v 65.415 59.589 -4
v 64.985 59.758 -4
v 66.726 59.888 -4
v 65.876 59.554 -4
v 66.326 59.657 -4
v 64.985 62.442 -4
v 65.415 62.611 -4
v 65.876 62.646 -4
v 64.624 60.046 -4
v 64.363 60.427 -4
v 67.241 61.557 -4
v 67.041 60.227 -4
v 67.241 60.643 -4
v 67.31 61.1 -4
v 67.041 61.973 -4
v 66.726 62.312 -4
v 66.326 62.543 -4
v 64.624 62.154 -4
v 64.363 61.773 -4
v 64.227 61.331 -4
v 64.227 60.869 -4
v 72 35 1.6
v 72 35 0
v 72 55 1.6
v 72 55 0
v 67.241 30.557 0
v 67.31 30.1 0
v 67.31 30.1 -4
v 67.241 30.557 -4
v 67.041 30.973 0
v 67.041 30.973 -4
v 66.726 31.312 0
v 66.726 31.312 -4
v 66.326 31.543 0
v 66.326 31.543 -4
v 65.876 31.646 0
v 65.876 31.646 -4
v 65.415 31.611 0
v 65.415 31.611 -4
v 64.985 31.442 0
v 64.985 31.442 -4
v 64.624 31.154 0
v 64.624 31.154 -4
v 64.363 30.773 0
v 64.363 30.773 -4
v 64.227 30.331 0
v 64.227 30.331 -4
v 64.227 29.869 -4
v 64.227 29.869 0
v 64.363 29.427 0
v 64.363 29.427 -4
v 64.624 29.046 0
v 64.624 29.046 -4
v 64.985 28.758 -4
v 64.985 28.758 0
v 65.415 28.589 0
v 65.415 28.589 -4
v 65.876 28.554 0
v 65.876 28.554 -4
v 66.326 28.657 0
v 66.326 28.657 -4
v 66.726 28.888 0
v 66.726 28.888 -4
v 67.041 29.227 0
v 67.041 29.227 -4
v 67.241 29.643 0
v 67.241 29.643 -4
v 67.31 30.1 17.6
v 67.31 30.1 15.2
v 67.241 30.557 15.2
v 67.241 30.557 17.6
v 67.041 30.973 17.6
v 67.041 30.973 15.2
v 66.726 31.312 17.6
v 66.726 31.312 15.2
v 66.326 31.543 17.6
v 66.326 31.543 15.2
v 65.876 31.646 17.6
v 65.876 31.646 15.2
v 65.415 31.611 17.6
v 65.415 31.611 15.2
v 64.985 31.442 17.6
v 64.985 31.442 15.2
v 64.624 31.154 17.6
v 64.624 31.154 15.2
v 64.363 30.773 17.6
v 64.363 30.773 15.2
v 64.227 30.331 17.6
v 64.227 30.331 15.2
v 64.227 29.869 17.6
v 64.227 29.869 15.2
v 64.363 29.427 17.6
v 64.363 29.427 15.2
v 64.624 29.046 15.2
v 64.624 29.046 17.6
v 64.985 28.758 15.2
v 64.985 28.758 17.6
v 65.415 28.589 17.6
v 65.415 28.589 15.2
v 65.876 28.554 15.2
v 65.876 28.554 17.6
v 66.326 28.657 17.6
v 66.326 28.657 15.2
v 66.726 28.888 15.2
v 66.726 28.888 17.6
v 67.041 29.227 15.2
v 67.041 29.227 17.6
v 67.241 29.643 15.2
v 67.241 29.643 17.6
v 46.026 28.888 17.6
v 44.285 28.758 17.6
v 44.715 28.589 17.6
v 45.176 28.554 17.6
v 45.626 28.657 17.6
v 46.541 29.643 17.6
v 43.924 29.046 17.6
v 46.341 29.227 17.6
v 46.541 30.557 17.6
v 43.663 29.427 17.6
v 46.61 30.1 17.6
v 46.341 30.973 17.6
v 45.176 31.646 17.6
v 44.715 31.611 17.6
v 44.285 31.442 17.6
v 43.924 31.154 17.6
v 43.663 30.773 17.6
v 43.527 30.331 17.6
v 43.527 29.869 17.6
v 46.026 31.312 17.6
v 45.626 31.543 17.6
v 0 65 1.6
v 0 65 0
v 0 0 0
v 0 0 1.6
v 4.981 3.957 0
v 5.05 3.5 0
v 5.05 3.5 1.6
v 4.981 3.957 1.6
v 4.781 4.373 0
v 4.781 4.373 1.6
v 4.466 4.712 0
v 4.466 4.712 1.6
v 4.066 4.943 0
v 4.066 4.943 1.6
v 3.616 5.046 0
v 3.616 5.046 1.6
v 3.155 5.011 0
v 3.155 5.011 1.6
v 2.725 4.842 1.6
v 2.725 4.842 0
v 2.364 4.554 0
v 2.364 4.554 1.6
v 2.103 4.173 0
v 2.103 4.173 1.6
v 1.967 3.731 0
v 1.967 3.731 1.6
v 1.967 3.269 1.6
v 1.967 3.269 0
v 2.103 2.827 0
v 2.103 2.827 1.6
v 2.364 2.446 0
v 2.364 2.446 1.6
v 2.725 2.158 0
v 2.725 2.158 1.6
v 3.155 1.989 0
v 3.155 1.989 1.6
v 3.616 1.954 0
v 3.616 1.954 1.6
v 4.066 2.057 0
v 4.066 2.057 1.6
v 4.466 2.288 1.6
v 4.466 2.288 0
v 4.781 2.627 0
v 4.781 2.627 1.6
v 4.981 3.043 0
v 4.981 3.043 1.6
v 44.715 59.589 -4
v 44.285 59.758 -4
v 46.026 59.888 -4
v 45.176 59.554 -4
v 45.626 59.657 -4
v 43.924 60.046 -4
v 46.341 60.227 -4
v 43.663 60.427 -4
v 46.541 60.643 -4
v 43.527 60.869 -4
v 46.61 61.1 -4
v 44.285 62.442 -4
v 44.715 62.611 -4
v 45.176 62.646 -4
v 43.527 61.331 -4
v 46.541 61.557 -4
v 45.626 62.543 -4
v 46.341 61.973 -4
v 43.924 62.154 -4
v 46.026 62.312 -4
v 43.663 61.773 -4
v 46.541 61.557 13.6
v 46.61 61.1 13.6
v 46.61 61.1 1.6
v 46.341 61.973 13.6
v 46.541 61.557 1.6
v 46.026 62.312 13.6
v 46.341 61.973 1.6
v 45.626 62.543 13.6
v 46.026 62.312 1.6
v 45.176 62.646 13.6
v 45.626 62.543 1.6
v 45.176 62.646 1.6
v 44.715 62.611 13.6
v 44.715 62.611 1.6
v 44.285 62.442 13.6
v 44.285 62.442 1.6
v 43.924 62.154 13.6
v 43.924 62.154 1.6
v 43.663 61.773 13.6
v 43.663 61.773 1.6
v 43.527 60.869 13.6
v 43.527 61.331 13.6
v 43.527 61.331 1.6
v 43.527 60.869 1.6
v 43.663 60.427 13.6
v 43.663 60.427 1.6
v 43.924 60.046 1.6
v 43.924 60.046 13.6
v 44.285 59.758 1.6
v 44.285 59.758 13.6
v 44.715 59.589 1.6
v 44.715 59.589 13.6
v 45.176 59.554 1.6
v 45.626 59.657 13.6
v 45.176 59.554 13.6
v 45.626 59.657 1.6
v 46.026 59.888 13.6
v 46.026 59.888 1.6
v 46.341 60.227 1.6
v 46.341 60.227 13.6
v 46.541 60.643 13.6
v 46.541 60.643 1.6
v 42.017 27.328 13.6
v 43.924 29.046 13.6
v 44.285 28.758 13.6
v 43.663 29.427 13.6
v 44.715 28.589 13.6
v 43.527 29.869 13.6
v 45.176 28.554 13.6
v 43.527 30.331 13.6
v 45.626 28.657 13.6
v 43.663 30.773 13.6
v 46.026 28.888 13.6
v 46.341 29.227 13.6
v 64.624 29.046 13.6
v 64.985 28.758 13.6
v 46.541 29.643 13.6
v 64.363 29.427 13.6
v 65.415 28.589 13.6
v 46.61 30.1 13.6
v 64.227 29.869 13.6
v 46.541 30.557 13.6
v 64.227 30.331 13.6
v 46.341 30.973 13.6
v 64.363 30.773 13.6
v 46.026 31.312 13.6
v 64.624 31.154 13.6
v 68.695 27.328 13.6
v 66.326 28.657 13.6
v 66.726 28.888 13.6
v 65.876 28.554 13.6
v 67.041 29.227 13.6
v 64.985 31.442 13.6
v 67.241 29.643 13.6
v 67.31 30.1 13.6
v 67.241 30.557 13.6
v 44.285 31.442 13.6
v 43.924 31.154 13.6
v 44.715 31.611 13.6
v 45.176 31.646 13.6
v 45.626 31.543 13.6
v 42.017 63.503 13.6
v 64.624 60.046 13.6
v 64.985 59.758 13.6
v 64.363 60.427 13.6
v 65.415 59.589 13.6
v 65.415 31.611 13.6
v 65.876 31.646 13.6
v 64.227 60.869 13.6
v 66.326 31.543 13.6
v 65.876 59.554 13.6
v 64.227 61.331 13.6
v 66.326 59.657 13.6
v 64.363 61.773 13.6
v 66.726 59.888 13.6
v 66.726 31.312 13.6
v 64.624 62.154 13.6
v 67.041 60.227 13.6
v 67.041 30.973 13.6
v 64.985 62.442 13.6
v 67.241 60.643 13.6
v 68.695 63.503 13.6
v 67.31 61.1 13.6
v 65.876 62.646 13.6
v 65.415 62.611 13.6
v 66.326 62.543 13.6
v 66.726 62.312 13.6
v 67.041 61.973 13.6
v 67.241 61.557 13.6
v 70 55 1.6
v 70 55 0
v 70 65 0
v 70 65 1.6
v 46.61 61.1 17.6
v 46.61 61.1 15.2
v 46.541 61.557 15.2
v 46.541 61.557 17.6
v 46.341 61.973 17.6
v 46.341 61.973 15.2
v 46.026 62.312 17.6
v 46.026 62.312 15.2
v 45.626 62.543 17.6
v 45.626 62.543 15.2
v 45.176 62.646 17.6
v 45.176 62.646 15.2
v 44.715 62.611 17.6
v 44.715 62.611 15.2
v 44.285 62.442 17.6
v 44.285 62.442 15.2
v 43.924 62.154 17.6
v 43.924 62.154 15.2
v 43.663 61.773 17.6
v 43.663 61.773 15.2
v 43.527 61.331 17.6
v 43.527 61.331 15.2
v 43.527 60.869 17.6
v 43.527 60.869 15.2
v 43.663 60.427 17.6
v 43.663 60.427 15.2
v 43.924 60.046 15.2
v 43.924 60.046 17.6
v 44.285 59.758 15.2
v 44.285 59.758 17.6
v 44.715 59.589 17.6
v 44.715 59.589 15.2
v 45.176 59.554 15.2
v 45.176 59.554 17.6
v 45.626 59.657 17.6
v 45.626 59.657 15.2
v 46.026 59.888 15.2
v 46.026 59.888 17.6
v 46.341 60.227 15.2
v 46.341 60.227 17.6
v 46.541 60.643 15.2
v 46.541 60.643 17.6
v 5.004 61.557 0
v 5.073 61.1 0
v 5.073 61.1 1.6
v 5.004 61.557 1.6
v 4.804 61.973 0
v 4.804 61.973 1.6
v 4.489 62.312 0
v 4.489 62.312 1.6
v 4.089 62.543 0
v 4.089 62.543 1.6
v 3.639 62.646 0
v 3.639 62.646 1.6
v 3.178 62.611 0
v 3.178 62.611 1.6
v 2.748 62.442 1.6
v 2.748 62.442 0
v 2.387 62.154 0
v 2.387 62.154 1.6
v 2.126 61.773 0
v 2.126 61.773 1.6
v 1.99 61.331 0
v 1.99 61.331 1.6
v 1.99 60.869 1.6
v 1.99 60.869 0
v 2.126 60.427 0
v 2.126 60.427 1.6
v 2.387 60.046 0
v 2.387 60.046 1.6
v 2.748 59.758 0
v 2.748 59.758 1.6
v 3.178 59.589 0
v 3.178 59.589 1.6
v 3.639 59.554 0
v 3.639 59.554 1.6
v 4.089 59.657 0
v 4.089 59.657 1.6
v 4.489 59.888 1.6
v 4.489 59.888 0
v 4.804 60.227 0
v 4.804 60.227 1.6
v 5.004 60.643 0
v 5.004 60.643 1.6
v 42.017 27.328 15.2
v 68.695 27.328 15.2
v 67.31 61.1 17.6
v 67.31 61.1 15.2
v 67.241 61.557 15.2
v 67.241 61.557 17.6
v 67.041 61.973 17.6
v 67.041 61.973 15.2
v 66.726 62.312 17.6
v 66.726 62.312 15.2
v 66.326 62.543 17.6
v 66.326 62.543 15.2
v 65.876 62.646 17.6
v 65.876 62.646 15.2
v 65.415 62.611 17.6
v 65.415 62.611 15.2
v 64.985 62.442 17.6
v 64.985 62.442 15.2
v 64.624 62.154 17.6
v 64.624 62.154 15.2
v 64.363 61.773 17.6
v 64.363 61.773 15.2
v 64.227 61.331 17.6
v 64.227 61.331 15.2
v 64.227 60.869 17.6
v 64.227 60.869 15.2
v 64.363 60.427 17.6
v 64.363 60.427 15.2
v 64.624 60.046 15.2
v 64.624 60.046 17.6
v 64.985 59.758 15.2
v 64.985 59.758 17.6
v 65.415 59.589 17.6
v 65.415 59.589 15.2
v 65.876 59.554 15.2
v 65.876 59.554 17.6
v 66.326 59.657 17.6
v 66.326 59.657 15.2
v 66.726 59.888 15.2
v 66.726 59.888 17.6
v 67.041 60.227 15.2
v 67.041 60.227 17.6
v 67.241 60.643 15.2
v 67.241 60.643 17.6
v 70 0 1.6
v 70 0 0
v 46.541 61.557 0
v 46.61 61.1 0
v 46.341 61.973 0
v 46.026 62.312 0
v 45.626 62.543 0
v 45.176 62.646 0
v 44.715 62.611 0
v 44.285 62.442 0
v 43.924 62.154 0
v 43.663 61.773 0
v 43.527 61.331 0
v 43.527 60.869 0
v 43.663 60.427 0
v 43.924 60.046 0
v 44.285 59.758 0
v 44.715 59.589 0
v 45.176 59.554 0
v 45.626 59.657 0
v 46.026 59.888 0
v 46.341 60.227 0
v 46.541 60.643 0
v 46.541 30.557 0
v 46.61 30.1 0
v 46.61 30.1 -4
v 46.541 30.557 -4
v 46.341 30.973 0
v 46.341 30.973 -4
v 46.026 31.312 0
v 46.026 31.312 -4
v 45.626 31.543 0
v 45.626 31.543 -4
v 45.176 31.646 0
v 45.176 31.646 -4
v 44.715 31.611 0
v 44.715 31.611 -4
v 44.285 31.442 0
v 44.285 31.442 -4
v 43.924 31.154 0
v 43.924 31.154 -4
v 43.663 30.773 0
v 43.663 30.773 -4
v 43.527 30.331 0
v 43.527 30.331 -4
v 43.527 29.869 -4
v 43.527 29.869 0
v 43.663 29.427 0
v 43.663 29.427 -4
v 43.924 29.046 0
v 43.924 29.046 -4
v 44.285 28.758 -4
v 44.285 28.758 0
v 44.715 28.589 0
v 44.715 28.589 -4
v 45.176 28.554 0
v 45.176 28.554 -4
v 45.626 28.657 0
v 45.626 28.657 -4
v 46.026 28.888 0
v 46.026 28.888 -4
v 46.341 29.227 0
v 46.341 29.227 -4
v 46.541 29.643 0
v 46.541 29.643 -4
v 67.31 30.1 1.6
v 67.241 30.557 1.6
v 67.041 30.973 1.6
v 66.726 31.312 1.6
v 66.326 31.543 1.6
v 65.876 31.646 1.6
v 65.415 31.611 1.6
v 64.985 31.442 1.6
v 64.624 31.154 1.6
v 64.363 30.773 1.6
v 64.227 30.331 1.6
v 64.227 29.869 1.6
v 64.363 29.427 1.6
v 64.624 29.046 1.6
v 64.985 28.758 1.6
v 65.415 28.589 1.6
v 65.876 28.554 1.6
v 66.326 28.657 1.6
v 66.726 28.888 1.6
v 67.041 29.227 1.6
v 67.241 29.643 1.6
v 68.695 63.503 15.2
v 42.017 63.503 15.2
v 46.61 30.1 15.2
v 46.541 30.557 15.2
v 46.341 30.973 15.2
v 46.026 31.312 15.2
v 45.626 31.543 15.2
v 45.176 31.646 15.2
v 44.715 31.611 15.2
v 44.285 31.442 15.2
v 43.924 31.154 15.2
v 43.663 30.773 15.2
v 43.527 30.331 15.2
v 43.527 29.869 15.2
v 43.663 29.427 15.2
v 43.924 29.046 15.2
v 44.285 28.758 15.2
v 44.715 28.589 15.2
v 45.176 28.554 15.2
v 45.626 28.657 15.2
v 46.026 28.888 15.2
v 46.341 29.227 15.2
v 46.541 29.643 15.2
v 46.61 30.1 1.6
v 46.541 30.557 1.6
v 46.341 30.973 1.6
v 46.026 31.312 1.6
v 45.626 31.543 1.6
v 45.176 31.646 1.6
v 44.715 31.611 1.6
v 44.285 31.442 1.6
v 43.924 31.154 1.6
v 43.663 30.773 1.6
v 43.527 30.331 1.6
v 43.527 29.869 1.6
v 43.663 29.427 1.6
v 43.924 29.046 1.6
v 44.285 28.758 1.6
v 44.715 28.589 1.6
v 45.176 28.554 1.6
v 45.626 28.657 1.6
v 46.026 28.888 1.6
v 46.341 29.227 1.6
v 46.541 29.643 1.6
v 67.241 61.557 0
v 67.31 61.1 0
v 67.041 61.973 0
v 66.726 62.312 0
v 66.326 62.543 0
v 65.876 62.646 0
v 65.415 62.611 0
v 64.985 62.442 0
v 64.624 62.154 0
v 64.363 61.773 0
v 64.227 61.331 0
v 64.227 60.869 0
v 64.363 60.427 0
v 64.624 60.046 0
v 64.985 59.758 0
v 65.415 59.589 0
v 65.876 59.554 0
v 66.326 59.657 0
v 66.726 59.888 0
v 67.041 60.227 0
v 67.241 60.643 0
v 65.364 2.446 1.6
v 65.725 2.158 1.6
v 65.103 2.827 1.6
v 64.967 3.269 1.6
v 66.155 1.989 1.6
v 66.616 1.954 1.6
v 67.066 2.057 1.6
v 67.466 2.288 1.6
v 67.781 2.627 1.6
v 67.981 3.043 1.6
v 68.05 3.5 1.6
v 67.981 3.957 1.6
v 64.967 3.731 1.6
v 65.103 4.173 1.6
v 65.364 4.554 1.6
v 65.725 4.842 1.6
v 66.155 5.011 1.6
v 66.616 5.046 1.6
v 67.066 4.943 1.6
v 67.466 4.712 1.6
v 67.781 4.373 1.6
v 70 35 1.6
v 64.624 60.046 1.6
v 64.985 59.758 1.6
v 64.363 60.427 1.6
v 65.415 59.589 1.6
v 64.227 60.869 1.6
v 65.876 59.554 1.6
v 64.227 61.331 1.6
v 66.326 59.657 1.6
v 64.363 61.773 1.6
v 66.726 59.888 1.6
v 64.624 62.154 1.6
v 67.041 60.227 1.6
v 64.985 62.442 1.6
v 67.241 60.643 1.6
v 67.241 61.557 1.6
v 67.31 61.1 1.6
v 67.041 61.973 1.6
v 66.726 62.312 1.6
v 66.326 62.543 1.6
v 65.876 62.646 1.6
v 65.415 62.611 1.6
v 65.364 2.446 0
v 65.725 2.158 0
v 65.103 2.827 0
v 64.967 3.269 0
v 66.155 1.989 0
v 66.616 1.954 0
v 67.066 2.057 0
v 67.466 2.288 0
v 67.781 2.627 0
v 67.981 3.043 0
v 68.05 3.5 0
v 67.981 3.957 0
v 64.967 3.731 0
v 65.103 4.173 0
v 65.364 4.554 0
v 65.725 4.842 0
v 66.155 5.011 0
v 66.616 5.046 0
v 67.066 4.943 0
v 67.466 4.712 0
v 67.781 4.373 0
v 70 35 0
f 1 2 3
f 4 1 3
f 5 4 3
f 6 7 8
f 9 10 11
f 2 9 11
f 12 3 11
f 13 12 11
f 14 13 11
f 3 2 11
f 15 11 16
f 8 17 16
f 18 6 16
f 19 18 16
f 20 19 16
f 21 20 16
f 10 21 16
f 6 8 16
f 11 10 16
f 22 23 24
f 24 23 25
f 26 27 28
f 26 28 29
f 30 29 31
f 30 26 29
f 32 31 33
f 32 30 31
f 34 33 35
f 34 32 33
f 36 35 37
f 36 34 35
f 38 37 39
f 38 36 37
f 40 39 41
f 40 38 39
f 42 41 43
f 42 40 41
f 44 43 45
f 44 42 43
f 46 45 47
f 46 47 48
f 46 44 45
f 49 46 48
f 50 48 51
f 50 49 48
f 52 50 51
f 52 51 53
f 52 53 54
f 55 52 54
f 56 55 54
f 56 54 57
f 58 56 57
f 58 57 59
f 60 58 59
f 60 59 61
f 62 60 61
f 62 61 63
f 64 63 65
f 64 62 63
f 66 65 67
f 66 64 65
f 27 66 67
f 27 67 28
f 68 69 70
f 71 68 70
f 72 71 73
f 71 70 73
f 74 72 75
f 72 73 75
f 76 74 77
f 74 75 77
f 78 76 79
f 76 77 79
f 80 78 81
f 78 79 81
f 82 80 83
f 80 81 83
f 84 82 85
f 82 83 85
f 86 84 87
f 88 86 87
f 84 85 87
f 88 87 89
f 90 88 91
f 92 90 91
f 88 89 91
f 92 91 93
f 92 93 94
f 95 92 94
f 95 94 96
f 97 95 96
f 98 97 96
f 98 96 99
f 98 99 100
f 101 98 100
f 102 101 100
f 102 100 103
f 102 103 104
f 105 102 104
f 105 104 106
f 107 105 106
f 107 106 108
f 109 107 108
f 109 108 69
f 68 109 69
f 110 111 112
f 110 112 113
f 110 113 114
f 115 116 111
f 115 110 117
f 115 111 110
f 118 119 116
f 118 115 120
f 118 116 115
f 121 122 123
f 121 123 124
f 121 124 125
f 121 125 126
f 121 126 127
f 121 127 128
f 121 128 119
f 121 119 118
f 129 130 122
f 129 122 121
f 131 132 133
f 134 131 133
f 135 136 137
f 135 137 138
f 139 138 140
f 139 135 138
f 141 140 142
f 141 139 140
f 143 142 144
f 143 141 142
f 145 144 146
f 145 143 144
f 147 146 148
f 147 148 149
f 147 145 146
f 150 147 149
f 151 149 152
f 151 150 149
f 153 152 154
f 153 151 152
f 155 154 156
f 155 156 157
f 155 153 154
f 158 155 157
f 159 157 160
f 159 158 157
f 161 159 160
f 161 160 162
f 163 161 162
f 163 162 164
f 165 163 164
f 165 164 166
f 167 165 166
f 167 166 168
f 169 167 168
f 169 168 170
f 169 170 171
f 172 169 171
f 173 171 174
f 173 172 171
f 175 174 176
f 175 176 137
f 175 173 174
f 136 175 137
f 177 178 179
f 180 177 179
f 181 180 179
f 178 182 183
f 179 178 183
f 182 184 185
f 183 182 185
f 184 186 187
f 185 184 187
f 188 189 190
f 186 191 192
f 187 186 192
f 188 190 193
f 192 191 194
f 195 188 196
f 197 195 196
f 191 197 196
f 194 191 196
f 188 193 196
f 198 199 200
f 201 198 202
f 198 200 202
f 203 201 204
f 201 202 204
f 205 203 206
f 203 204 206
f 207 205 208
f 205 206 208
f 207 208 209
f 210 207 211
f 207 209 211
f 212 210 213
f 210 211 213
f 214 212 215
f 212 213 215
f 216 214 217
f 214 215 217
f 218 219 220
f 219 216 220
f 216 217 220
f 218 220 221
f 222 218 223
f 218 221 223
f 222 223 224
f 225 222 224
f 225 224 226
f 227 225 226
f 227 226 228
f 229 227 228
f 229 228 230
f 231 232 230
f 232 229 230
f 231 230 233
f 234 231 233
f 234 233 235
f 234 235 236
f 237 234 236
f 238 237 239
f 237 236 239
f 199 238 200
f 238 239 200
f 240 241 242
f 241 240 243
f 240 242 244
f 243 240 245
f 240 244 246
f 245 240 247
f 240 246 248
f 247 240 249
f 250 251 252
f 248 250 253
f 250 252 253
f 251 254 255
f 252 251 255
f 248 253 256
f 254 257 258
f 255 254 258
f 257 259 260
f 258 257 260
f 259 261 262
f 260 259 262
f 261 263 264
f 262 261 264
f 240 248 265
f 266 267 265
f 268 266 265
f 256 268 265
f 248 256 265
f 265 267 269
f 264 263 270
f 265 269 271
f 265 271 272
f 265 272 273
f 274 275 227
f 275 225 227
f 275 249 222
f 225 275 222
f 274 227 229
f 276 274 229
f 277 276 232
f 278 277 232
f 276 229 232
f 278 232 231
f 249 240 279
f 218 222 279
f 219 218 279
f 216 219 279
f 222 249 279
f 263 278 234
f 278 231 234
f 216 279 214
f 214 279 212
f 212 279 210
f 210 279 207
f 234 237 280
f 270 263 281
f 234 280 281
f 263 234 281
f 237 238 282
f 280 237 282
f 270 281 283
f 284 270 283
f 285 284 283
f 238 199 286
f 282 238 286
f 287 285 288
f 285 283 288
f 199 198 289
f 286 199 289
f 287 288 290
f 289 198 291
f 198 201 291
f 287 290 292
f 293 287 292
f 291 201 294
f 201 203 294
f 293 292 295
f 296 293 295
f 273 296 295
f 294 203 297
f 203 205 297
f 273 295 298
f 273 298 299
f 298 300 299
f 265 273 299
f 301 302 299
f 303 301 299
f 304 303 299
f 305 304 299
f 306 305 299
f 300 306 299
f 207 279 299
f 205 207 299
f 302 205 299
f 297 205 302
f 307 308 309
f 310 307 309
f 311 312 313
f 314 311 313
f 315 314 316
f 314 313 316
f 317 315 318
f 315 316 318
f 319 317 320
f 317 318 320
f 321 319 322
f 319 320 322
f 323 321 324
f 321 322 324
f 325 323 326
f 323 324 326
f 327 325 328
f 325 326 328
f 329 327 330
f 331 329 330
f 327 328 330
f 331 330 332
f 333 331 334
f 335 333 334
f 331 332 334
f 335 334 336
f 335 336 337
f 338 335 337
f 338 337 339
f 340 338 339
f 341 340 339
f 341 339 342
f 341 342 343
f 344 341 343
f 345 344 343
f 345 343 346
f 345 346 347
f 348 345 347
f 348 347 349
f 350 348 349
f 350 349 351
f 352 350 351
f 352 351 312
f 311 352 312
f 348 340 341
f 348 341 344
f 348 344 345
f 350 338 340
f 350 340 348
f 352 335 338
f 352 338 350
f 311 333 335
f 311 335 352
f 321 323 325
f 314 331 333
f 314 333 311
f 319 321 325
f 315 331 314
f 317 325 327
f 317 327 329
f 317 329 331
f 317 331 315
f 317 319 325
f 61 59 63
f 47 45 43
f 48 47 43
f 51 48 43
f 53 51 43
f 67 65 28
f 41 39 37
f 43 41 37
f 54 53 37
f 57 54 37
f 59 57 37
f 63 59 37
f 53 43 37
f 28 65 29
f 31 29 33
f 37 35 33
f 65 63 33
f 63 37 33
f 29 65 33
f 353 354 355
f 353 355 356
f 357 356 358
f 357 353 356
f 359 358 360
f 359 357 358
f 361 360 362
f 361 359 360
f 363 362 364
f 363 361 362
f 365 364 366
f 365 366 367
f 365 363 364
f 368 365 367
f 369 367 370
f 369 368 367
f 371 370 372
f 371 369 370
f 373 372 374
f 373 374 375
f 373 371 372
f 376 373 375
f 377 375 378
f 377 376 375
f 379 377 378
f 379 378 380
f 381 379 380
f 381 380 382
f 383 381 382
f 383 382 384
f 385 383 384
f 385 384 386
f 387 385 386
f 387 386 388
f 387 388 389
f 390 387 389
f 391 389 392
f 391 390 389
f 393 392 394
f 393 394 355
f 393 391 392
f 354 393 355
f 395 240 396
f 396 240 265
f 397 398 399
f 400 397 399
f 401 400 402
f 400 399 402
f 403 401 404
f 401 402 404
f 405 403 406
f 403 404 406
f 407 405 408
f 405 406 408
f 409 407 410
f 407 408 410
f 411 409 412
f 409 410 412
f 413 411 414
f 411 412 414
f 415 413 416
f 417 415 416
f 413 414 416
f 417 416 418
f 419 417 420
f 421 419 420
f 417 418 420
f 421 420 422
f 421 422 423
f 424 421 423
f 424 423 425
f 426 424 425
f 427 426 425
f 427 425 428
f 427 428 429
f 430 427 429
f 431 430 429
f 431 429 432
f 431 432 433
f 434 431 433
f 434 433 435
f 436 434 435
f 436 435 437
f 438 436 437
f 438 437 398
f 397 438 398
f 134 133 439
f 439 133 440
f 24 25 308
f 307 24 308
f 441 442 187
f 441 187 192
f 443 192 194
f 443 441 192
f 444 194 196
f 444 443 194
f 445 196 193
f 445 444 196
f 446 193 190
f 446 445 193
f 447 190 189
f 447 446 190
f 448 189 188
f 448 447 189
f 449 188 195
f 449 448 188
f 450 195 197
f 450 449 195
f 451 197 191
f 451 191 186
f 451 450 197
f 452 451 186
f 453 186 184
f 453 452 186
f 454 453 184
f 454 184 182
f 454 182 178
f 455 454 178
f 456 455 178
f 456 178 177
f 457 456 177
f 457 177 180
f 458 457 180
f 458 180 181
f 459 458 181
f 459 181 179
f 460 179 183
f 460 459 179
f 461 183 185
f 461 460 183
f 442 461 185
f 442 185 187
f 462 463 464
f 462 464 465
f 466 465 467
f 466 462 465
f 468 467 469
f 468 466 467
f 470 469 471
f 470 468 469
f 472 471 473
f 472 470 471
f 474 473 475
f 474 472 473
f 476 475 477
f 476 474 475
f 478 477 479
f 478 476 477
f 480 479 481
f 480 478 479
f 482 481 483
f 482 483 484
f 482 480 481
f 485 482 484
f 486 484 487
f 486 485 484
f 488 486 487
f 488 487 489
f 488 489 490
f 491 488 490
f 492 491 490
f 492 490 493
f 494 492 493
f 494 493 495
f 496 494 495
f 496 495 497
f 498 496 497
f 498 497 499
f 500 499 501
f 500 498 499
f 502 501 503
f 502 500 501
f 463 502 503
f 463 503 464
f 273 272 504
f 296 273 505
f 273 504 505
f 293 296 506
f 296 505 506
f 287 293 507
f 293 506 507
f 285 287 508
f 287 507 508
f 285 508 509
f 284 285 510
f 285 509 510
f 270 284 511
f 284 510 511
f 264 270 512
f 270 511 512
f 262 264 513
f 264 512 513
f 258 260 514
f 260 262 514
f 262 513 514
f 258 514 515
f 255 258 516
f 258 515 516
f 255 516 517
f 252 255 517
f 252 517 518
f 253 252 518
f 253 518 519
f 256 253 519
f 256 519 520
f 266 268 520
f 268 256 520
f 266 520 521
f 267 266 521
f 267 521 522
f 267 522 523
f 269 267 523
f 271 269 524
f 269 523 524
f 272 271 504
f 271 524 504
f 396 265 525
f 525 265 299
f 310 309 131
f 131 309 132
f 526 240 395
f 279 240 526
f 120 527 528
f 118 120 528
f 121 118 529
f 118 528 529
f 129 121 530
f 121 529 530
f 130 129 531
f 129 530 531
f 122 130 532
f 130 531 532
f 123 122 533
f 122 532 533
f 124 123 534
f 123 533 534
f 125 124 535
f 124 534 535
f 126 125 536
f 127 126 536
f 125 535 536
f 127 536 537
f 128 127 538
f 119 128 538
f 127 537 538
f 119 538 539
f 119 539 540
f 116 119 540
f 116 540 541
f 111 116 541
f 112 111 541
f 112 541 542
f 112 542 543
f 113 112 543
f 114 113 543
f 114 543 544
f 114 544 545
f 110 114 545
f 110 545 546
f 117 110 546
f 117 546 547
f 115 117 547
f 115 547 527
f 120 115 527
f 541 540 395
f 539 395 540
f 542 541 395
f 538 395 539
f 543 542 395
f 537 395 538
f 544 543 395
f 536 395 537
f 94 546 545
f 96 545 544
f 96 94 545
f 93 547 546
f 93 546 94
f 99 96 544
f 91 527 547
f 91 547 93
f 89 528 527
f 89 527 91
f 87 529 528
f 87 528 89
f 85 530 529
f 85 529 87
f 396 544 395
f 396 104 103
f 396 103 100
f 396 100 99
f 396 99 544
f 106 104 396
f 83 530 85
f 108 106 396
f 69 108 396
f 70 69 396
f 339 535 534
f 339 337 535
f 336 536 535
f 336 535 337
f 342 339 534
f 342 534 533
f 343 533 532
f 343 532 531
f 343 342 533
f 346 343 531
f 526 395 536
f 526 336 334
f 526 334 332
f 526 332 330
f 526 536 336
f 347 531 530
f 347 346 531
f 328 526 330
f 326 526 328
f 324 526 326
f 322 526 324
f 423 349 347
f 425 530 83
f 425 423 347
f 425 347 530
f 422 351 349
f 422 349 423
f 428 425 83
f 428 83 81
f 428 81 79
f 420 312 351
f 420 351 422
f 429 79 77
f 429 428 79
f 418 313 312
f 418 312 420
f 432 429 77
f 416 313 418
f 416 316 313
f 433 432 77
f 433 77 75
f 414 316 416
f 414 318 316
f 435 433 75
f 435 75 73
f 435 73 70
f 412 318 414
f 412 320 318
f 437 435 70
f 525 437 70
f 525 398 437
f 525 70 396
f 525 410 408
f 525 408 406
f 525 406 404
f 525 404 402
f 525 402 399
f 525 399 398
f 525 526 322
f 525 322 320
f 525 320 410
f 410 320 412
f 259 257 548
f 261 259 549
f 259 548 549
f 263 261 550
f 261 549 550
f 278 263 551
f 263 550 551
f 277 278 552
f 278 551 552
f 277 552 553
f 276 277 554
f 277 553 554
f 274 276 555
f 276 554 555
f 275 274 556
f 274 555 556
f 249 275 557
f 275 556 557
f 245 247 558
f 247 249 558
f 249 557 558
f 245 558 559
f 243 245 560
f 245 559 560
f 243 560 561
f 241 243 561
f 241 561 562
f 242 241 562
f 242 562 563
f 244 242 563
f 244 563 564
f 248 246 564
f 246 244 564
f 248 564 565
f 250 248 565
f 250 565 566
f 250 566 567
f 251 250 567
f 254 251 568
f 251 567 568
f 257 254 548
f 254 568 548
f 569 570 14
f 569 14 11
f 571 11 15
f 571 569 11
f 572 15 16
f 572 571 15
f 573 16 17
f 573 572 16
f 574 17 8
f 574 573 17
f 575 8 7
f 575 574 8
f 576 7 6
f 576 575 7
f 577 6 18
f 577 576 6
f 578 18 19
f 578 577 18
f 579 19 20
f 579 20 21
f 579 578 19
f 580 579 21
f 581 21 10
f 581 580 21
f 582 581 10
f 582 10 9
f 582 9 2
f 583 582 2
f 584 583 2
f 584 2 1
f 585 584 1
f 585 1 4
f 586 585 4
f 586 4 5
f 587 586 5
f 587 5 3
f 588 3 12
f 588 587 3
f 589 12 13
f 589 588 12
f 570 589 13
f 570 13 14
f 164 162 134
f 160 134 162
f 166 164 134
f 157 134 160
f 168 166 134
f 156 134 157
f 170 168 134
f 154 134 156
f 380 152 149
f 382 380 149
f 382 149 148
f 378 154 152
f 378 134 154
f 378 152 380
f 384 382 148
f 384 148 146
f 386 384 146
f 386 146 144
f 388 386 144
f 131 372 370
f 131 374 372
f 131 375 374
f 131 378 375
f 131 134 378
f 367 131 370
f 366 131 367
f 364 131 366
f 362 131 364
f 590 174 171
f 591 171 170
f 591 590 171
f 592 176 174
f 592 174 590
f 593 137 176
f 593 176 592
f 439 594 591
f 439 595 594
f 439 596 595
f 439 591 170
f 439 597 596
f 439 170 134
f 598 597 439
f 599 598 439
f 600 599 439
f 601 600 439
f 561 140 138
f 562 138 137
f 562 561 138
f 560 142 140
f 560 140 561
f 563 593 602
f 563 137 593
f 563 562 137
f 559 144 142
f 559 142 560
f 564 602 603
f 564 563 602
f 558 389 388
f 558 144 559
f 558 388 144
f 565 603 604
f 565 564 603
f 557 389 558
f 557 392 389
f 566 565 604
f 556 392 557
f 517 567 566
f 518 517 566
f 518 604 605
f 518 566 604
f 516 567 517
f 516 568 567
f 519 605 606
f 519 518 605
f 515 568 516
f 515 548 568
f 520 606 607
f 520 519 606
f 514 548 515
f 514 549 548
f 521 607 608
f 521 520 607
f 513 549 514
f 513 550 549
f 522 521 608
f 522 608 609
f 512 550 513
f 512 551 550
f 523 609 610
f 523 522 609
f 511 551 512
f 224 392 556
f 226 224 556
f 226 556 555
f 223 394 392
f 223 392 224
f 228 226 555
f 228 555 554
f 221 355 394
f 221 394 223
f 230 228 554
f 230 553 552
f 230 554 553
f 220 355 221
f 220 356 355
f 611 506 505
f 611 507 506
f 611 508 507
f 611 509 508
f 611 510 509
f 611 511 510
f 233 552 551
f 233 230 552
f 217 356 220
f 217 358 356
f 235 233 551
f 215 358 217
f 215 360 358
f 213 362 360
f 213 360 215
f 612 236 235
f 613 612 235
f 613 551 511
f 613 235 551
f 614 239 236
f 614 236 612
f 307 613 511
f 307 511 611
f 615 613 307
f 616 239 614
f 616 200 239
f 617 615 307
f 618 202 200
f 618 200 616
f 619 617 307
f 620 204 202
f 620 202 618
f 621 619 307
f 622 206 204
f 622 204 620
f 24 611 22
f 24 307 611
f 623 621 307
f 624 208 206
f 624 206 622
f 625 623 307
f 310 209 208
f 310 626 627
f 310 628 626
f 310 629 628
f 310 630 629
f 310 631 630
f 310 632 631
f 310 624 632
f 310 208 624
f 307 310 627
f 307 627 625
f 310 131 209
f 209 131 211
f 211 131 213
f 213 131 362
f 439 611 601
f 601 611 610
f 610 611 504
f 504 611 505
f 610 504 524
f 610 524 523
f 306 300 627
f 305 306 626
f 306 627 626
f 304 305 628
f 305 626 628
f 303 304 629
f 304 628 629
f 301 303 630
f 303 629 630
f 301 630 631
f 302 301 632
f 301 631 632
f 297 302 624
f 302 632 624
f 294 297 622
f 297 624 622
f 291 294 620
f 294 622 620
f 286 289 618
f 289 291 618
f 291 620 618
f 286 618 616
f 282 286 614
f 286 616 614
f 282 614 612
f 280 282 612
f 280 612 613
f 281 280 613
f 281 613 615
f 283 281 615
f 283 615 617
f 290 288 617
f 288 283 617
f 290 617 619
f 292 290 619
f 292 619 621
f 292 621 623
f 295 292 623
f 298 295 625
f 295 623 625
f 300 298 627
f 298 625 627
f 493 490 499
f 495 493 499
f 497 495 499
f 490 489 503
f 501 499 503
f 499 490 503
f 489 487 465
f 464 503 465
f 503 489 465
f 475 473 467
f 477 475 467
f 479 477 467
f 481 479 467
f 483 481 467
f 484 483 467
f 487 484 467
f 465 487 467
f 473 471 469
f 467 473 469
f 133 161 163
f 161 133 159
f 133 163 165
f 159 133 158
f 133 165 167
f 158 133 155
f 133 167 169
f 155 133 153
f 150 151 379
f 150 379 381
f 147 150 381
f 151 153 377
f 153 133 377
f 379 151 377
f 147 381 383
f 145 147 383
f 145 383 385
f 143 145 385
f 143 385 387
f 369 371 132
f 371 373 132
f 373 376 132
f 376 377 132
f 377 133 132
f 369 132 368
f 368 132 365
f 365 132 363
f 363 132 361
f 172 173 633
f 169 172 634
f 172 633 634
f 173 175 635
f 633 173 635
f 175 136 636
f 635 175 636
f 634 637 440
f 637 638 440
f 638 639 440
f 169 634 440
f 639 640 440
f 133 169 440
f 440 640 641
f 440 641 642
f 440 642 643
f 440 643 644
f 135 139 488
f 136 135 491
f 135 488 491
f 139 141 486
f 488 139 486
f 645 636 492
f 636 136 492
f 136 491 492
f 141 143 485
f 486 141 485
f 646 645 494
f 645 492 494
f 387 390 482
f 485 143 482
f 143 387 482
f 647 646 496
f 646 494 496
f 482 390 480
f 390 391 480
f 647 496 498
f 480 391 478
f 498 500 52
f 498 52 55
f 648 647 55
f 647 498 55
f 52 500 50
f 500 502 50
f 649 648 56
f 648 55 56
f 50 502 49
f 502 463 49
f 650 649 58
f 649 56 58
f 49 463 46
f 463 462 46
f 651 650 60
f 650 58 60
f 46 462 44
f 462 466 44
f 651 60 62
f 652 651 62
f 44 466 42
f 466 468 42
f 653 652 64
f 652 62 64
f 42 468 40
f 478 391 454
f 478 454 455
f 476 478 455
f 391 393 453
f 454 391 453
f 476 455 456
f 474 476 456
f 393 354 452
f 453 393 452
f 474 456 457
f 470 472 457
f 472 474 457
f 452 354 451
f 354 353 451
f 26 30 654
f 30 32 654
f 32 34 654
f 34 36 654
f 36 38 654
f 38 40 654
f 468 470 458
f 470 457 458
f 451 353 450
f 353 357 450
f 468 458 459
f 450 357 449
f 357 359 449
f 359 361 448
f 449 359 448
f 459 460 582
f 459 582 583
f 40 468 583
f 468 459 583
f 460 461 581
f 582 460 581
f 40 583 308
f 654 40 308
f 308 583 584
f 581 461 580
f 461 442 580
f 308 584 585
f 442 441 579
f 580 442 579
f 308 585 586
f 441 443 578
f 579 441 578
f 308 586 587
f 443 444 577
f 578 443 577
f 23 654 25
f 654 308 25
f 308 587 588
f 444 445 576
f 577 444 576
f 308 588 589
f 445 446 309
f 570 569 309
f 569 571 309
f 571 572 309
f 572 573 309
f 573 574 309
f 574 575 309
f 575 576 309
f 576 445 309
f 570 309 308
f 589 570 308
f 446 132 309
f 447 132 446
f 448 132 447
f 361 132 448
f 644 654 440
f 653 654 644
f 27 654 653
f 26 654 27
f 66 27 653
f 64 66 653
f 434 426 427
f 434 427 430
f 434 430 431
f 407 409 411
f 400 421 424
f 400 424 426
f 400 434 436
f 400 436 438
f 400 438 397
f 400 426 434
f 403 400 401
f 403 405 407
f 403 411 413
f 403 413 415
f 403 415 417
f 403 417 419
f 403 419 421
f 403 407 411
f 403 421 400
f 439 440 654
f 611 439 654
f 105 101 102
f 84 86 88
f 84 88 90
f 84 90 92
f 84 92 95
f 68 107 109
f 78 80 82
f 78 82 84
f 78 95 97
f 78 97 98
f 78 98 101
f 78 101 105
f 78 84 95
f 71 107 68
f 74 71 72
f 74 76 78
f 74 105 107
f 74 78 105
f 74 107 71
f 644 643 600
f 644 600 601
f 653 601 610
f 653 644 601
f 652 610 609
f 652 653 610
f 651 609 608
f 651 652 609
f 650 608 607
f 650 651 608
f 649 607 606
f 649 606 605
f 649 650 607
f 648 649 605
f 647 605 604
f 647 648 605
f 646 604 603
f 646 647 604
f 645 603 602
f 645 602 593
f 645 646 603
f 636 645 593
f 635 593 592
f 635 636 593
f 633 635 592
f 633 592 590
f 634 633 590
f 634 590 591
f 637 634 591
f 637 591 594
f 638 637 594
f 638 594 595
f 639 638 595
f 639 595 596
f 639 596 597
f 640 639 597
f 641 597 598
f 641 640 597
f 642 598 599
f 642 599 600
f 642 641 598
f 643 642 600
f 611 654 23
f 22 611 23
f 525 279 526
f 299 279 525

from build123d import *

# Parameters (mm, degrees)
SKETCH1_R             = 1.55
BOSS_EXTRUDE1_DEPTH   = 1.6
SKETCH1_3_R           = 1.55
BOSS_EXTRUDE2_DEPTH   = 4
BOSS_EXTRUDE2_2_DEPTH = 4
BOSS_EXTRUDE2_3_DEPTH = 4
BOSS_EXTRUDE2_4_DEPTH = 4
SKETCH1_4_R           = 1.55
BOSS_EXTRUDE3_DEPTH   = 17.6
BOSS_EXTRUDE4_START   = 12
SKETCH2_W             = 26.677983171
SKETCH2_H             = 36.175587157
BOSS_EXTRUDE4_DEPTH   = 1.6


with BuildPart() as part:
    # Sketch1 → Boss-Extrude1 (new body)
    with BuildSketch(Plane.XY):
        Polygon((70, 55), (70, 65), (0, 65), (0, 0), (70, 0), (70, 35), (72, 35), (72, 55), align=None)
        with Locations((3.523, 61.1)):
            Circle(SKETCH1_R, mode=Mode.SUBTRACT)
        with Locations((3.5, 3.5)):
            Circle(SKETCH1_R, mode=Mode.SUBTRACT)
        with Locations((66.5, 3.5)):
            Circle(SKETCH1_R, mode=Mode.SUBTRACT)
        with Locations((45.06, 61.1)):
            Circle(SKETCH1_R, mode=Mode.SUBTRACT)
        with Locations((65.76, 61.1)):
            Circle(SKETCH1_R, mode=Mode.SUBTRACT)
        with Locations((45.06, 30.1)):
            Circle(SKETCH1_R, mode=Mode.SUBTRACT)
        with Locations((65.76, 30.1)):
            Circle(SKETCH1_R, mode=Mode.SUBTRACT)
    extrude(amount=BOSS_EXTRUDE1_DEPTH)



with BuildPart() as body_2:
    # Sketch1<3> → Boss-Extrude2 (new body)
    with BuildSketch(Plane.XY):
        with Locations((45.06, 61.1)):
            Circle(SKETCH1_3_R)
    extrude(amount=-BOSS_EXTRUDE2_DEPTH)


with BuildPart() as body_3:
    # Sketch1<3> → Boss-Extrude2 2 (new body)
    with BuildSketch(Plane.XY):
        with Locations((65.76, 61.1)):
            Circle(SKETCH1_3_R)
    extrude(amount=-BOSS_EXTRUDE2_2_DEPTH)


with BuildPart() as body_4:
    # Sketch1<3> → Boss-Extrude2 3 (new body)
    with BuildSketch(Plane.XY):
        with Locations((45.06, 30.1)):
            Circle(SKETCH1_3_R)
    extrude(amount=-BOSS_EXTRUDE2_3_DEPTH)


with BuildPart() as body_5:
    # Sketch1<3> → Boss-Extrude2 4 (new body)
    with BuildSketch(Plane.XY):
        with Locations((65.76, 30.1)):
            Circle(SKETCH1_3_R)
    extrude(amount=-BOSS_EXTRUDE2_4_DEPTH)


with BuildPart() as part_1:
    add(part.part)

    add(body_2.part)  # Boss-Extrude3 merges body 2

    add(body_3.part)  # Boss-Extrude3 merges body 3

    add(body_4.part)  # Boss-Extrude3 merges body 4

    add(body_5.part)  # Boss-Extrude3 merges body 5
    # Sketch1<4> → Boss-Extrude3 (add)
    with BuildSketch(Plane.XY):
        with Locations((45.06, 61.1)):
            Circle(SKETCH1_4_R)
        with Locations((65.76, 61.1)):
            Circle(SKETCH1_4_R)
        with Locations((45.06, 30.1)):
            Circle(SKETCH1_4_R)
        with Locations((65.76, 30.1)):
            Circle(SKETCH1_4_R)
    extrude(amount=BOSS_EXTRUDE3_DEPTH)

    # Sketch2 → Boss-Extrude4 (add)
    with BuildSketch(Plane.XY.offset(1.6).offset(BOSS_EXTRUDE4_START)):
        with Locations((55.356329563, 45.415531536)):
            Rectangle(SKETCH2_W, SKETCH2_H)
    extrude(amount=BOSS_EXTRUDE4_DEPTH)


solid = part_1.part
